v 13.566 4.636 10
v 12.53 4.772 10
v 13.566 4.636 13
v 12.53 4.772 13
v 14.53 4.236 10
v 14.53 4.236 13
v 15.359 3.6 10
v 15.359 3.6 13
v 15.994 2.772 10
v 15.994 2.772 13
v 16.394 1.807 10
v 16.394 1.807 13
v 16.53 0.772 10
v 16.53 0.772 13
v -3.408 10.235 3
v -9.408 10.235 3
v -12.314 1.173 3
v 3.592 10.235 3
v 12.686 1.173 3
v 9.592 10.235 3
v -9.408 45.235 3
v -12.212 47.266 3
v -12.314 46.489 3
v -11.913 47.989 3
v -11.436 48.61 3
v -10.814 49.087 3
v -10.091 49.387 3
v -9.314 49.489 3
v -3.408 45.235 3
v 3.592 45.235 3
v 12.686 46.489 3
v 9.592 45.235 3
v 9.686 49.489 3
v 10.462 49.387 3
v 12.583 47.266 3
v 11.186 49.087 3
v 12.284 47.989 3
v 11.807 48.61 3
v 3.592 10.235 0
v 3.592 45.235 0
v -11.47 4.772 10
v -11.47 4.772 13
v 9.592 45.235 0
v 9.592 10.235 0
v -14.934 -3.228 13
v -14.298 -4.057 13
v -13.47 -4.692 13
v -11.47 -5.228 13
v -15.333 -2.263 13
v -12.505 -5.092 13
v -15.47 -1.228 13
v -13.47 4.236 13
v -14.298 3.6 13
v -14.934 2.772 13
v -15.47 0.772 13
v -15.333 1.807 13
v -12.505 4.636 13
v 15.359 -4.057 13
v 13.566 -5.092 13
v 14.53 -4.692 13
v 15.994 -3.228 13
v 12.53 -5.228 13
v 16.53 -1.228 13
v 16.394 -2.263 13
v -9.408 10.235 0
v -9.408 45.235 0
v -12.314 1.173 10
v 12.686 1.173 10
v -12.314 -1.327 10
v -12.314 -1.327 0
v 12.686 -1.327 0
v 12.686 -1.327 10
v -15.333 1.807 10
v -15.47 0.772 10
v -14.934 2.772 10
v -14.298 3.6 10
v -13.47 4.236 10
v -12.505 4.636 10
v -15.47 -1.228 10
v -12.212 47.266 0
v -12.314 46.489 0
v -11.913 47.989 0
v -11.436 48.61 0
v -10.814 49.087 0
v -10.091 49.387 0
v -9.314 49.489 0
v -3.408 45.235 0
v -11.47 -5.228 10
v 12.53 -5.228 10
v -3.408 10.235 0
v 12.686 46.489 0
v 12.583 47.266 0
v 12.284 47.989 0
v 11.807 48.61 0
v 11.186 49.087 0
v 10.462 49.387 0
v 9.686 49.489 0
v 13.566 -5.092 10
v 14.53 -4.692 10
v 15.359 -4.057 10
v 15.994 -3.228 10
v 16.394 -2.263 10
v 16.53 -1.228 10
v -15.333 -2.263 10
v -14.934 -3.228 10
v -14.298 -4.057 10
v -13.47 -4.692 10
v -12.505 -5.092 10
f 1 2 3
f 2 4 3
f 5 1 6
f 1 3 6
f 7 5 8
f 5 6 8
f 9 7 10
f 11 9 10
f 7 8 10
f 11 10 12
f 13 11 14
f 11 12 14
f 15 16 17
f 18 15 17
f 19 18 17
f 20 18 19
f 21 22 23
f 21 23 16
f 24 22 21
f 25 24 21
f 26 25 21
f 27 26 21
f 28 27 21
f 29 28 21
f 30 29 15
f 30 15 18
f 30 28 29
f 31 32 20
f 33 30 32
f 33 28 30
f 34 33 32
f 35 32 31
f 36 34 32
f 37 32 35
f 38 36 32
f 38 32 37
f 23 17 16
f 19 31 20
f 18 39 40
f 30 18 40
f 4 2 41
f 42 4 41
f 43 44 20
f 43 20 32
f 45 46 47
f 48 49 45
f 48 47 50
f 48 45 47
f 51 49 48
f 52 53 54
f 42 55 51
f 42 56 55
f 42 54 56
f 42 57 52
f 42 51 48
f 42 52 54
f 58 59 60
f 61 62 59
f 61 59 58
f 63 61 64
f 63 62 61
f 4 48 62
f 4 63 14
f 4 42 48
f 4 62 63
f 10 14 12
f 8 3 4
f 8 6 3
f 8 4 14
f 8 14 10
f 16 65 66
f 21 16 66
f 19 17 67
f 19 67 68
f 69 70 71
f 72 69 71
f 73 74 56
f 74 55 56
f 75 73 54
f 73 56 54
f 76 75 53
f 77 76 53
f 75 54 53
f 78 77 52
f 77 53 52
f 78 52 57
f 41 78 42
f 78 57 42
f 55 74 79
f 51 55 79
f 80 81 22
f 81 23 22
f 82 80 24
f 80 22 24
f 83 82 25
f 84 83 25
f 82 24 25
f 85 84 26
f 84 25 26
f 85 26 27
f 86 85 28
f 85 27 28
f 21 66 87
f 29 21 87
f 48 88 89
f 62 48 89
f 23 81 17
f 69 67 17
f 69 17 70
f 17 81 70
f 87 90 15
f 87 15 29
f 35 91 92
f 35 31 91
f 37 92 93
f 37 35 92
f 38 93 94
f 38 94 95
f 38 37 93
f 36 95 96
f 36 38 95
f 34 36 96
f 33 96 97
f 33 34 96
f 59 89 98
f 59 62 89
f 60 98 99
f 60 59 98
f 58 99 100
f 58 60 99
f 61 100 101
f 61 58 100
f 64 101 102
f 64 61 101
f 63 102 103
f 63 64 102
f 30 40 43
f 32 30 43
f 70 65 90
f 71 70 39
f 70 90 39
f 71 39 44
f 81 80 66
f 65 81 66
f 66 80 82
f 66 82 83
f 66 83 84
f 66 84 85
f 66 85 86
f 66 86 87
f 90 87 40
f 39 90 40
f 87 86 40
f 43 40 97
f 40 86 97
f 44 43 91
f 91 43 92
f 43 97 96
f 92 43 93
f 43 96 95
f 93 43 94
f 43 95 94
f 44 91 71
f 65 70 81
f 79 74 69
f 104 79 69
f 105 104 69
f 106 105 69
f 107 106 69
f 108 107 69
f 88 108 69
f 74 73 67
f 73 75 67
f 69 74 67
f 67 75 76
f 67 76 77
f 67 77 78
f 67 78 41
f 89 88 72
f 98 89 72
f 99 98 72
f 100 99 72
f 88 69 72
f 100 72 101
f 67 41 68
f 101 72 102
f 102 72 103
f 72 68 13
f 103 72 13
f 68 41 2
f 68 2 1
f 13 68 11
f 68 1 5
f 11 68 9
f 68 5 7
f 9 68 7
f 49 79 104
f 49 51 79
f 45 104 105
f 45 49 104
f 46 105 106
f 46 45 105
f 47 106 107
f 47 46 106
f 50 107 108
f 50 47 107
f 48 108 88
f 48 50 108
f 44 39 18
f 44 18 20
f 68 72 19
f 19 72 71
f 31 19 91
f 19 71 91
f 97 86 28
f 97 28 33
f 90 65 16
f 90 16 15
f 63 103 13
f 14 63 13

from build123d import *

# Parameters (mm, degrees)
F0_W     = 25
F0_H     = 3.598708484
F0_H_2   = 2.5
F0_H_3   = 44.7172746155
F0_W_2   = 6
F0_H_4   = 35
F1_DEPTH = 3
F2_DEPTH = 10
F3_START = 10
F3_DEPTH = 3
F4_R     = 4
F5_R     = 3


# Not quite as in the source:
# - a feature names something its author has since deleted; it is built from what else it names


with BuildPart() as f1:
    # F0 (on Top) → F1 (new body)
    with BuildSketch(Plane.XY):
        with Locations((0.1855289564, 2.9724632242)):
            Rectangle(F0_W, F0_H)
        with Locations((0.1855289564, -0.0768910178)):
            Rectangle(F0_W, F0_H_2)
        with Locations((0.1855289564, 27.130454774)):
            Rectangle(F0_W, F0_H_3)
        with Locations((-6.4080492333, 27.7351317182)):
            Rectangle(F0_W_2, F0_H_4, mode=Mode.SUBTRACT)
        with Locations((6.5919507667, 27.7351317182)):
            Rectangle(F0_W_2, F0_H_4, mode=Mode.SUBTRACT)
    extrude(amount=F1_DEPTH)

    # F0 (on Top) → F2 (join)
    with BuildSketch(Plane.XY):
        with Locations((0.1855289564, -0.0768910178)):
            Rectangle(F0_W, F0_H_2)
    extrude(amount=F2_DEPTH)

    # F0 (on Top) → F3 (join)
    with BuildSketch(Plane.XY.offset(F3_START)):
        with Locations((0.1855289564, 2.9724632242)):
            Rectangle(F0_W, F0_H)
        Polygon((-12.3144710436, -1.3268910178), (-12.3144710436, 1.1731089822), (-12.3144710436, 4.7718174662), (-15.4697376937, 4.7718174662), (-15.4697376937, -5.2281825338), (16.5302623063, -5.2281825338), (16.5302623063, 4.7718174662), (12.6855289564, 4.7718174662), (12.6855289564, 1.1731089822), (12.6855289564, -1.3268910178), align=None)
        with Locations((0.1855289564, -0.0768910178)):
            Rectangle(F0_W, F0_H_2)
    extrude(amount=F3_DEPTH)

    # F4
    f4_edges = [f1.edges().sort_by_distance(p)[0] for p in [
        (16.530262, -5.228183, 11.5),
        (16.530262, 4.771817, 11.5),
        (-15.469738, -5.228183, 11.5),
        (-15.469738, 4.771817, 11.5),
    ]]
    fillet(f4_edges, radius=F4_R)

    # F5
    f5_edges = [f1.edges().sort_by_distance(p)[0] for p in [
        (-12.314471, 49.489092, 1.5),
        (12.685529, 49.489092, 1.5),
    ]]
    fillet(f5_edges, radius=F5_R)


solid = f1.part
